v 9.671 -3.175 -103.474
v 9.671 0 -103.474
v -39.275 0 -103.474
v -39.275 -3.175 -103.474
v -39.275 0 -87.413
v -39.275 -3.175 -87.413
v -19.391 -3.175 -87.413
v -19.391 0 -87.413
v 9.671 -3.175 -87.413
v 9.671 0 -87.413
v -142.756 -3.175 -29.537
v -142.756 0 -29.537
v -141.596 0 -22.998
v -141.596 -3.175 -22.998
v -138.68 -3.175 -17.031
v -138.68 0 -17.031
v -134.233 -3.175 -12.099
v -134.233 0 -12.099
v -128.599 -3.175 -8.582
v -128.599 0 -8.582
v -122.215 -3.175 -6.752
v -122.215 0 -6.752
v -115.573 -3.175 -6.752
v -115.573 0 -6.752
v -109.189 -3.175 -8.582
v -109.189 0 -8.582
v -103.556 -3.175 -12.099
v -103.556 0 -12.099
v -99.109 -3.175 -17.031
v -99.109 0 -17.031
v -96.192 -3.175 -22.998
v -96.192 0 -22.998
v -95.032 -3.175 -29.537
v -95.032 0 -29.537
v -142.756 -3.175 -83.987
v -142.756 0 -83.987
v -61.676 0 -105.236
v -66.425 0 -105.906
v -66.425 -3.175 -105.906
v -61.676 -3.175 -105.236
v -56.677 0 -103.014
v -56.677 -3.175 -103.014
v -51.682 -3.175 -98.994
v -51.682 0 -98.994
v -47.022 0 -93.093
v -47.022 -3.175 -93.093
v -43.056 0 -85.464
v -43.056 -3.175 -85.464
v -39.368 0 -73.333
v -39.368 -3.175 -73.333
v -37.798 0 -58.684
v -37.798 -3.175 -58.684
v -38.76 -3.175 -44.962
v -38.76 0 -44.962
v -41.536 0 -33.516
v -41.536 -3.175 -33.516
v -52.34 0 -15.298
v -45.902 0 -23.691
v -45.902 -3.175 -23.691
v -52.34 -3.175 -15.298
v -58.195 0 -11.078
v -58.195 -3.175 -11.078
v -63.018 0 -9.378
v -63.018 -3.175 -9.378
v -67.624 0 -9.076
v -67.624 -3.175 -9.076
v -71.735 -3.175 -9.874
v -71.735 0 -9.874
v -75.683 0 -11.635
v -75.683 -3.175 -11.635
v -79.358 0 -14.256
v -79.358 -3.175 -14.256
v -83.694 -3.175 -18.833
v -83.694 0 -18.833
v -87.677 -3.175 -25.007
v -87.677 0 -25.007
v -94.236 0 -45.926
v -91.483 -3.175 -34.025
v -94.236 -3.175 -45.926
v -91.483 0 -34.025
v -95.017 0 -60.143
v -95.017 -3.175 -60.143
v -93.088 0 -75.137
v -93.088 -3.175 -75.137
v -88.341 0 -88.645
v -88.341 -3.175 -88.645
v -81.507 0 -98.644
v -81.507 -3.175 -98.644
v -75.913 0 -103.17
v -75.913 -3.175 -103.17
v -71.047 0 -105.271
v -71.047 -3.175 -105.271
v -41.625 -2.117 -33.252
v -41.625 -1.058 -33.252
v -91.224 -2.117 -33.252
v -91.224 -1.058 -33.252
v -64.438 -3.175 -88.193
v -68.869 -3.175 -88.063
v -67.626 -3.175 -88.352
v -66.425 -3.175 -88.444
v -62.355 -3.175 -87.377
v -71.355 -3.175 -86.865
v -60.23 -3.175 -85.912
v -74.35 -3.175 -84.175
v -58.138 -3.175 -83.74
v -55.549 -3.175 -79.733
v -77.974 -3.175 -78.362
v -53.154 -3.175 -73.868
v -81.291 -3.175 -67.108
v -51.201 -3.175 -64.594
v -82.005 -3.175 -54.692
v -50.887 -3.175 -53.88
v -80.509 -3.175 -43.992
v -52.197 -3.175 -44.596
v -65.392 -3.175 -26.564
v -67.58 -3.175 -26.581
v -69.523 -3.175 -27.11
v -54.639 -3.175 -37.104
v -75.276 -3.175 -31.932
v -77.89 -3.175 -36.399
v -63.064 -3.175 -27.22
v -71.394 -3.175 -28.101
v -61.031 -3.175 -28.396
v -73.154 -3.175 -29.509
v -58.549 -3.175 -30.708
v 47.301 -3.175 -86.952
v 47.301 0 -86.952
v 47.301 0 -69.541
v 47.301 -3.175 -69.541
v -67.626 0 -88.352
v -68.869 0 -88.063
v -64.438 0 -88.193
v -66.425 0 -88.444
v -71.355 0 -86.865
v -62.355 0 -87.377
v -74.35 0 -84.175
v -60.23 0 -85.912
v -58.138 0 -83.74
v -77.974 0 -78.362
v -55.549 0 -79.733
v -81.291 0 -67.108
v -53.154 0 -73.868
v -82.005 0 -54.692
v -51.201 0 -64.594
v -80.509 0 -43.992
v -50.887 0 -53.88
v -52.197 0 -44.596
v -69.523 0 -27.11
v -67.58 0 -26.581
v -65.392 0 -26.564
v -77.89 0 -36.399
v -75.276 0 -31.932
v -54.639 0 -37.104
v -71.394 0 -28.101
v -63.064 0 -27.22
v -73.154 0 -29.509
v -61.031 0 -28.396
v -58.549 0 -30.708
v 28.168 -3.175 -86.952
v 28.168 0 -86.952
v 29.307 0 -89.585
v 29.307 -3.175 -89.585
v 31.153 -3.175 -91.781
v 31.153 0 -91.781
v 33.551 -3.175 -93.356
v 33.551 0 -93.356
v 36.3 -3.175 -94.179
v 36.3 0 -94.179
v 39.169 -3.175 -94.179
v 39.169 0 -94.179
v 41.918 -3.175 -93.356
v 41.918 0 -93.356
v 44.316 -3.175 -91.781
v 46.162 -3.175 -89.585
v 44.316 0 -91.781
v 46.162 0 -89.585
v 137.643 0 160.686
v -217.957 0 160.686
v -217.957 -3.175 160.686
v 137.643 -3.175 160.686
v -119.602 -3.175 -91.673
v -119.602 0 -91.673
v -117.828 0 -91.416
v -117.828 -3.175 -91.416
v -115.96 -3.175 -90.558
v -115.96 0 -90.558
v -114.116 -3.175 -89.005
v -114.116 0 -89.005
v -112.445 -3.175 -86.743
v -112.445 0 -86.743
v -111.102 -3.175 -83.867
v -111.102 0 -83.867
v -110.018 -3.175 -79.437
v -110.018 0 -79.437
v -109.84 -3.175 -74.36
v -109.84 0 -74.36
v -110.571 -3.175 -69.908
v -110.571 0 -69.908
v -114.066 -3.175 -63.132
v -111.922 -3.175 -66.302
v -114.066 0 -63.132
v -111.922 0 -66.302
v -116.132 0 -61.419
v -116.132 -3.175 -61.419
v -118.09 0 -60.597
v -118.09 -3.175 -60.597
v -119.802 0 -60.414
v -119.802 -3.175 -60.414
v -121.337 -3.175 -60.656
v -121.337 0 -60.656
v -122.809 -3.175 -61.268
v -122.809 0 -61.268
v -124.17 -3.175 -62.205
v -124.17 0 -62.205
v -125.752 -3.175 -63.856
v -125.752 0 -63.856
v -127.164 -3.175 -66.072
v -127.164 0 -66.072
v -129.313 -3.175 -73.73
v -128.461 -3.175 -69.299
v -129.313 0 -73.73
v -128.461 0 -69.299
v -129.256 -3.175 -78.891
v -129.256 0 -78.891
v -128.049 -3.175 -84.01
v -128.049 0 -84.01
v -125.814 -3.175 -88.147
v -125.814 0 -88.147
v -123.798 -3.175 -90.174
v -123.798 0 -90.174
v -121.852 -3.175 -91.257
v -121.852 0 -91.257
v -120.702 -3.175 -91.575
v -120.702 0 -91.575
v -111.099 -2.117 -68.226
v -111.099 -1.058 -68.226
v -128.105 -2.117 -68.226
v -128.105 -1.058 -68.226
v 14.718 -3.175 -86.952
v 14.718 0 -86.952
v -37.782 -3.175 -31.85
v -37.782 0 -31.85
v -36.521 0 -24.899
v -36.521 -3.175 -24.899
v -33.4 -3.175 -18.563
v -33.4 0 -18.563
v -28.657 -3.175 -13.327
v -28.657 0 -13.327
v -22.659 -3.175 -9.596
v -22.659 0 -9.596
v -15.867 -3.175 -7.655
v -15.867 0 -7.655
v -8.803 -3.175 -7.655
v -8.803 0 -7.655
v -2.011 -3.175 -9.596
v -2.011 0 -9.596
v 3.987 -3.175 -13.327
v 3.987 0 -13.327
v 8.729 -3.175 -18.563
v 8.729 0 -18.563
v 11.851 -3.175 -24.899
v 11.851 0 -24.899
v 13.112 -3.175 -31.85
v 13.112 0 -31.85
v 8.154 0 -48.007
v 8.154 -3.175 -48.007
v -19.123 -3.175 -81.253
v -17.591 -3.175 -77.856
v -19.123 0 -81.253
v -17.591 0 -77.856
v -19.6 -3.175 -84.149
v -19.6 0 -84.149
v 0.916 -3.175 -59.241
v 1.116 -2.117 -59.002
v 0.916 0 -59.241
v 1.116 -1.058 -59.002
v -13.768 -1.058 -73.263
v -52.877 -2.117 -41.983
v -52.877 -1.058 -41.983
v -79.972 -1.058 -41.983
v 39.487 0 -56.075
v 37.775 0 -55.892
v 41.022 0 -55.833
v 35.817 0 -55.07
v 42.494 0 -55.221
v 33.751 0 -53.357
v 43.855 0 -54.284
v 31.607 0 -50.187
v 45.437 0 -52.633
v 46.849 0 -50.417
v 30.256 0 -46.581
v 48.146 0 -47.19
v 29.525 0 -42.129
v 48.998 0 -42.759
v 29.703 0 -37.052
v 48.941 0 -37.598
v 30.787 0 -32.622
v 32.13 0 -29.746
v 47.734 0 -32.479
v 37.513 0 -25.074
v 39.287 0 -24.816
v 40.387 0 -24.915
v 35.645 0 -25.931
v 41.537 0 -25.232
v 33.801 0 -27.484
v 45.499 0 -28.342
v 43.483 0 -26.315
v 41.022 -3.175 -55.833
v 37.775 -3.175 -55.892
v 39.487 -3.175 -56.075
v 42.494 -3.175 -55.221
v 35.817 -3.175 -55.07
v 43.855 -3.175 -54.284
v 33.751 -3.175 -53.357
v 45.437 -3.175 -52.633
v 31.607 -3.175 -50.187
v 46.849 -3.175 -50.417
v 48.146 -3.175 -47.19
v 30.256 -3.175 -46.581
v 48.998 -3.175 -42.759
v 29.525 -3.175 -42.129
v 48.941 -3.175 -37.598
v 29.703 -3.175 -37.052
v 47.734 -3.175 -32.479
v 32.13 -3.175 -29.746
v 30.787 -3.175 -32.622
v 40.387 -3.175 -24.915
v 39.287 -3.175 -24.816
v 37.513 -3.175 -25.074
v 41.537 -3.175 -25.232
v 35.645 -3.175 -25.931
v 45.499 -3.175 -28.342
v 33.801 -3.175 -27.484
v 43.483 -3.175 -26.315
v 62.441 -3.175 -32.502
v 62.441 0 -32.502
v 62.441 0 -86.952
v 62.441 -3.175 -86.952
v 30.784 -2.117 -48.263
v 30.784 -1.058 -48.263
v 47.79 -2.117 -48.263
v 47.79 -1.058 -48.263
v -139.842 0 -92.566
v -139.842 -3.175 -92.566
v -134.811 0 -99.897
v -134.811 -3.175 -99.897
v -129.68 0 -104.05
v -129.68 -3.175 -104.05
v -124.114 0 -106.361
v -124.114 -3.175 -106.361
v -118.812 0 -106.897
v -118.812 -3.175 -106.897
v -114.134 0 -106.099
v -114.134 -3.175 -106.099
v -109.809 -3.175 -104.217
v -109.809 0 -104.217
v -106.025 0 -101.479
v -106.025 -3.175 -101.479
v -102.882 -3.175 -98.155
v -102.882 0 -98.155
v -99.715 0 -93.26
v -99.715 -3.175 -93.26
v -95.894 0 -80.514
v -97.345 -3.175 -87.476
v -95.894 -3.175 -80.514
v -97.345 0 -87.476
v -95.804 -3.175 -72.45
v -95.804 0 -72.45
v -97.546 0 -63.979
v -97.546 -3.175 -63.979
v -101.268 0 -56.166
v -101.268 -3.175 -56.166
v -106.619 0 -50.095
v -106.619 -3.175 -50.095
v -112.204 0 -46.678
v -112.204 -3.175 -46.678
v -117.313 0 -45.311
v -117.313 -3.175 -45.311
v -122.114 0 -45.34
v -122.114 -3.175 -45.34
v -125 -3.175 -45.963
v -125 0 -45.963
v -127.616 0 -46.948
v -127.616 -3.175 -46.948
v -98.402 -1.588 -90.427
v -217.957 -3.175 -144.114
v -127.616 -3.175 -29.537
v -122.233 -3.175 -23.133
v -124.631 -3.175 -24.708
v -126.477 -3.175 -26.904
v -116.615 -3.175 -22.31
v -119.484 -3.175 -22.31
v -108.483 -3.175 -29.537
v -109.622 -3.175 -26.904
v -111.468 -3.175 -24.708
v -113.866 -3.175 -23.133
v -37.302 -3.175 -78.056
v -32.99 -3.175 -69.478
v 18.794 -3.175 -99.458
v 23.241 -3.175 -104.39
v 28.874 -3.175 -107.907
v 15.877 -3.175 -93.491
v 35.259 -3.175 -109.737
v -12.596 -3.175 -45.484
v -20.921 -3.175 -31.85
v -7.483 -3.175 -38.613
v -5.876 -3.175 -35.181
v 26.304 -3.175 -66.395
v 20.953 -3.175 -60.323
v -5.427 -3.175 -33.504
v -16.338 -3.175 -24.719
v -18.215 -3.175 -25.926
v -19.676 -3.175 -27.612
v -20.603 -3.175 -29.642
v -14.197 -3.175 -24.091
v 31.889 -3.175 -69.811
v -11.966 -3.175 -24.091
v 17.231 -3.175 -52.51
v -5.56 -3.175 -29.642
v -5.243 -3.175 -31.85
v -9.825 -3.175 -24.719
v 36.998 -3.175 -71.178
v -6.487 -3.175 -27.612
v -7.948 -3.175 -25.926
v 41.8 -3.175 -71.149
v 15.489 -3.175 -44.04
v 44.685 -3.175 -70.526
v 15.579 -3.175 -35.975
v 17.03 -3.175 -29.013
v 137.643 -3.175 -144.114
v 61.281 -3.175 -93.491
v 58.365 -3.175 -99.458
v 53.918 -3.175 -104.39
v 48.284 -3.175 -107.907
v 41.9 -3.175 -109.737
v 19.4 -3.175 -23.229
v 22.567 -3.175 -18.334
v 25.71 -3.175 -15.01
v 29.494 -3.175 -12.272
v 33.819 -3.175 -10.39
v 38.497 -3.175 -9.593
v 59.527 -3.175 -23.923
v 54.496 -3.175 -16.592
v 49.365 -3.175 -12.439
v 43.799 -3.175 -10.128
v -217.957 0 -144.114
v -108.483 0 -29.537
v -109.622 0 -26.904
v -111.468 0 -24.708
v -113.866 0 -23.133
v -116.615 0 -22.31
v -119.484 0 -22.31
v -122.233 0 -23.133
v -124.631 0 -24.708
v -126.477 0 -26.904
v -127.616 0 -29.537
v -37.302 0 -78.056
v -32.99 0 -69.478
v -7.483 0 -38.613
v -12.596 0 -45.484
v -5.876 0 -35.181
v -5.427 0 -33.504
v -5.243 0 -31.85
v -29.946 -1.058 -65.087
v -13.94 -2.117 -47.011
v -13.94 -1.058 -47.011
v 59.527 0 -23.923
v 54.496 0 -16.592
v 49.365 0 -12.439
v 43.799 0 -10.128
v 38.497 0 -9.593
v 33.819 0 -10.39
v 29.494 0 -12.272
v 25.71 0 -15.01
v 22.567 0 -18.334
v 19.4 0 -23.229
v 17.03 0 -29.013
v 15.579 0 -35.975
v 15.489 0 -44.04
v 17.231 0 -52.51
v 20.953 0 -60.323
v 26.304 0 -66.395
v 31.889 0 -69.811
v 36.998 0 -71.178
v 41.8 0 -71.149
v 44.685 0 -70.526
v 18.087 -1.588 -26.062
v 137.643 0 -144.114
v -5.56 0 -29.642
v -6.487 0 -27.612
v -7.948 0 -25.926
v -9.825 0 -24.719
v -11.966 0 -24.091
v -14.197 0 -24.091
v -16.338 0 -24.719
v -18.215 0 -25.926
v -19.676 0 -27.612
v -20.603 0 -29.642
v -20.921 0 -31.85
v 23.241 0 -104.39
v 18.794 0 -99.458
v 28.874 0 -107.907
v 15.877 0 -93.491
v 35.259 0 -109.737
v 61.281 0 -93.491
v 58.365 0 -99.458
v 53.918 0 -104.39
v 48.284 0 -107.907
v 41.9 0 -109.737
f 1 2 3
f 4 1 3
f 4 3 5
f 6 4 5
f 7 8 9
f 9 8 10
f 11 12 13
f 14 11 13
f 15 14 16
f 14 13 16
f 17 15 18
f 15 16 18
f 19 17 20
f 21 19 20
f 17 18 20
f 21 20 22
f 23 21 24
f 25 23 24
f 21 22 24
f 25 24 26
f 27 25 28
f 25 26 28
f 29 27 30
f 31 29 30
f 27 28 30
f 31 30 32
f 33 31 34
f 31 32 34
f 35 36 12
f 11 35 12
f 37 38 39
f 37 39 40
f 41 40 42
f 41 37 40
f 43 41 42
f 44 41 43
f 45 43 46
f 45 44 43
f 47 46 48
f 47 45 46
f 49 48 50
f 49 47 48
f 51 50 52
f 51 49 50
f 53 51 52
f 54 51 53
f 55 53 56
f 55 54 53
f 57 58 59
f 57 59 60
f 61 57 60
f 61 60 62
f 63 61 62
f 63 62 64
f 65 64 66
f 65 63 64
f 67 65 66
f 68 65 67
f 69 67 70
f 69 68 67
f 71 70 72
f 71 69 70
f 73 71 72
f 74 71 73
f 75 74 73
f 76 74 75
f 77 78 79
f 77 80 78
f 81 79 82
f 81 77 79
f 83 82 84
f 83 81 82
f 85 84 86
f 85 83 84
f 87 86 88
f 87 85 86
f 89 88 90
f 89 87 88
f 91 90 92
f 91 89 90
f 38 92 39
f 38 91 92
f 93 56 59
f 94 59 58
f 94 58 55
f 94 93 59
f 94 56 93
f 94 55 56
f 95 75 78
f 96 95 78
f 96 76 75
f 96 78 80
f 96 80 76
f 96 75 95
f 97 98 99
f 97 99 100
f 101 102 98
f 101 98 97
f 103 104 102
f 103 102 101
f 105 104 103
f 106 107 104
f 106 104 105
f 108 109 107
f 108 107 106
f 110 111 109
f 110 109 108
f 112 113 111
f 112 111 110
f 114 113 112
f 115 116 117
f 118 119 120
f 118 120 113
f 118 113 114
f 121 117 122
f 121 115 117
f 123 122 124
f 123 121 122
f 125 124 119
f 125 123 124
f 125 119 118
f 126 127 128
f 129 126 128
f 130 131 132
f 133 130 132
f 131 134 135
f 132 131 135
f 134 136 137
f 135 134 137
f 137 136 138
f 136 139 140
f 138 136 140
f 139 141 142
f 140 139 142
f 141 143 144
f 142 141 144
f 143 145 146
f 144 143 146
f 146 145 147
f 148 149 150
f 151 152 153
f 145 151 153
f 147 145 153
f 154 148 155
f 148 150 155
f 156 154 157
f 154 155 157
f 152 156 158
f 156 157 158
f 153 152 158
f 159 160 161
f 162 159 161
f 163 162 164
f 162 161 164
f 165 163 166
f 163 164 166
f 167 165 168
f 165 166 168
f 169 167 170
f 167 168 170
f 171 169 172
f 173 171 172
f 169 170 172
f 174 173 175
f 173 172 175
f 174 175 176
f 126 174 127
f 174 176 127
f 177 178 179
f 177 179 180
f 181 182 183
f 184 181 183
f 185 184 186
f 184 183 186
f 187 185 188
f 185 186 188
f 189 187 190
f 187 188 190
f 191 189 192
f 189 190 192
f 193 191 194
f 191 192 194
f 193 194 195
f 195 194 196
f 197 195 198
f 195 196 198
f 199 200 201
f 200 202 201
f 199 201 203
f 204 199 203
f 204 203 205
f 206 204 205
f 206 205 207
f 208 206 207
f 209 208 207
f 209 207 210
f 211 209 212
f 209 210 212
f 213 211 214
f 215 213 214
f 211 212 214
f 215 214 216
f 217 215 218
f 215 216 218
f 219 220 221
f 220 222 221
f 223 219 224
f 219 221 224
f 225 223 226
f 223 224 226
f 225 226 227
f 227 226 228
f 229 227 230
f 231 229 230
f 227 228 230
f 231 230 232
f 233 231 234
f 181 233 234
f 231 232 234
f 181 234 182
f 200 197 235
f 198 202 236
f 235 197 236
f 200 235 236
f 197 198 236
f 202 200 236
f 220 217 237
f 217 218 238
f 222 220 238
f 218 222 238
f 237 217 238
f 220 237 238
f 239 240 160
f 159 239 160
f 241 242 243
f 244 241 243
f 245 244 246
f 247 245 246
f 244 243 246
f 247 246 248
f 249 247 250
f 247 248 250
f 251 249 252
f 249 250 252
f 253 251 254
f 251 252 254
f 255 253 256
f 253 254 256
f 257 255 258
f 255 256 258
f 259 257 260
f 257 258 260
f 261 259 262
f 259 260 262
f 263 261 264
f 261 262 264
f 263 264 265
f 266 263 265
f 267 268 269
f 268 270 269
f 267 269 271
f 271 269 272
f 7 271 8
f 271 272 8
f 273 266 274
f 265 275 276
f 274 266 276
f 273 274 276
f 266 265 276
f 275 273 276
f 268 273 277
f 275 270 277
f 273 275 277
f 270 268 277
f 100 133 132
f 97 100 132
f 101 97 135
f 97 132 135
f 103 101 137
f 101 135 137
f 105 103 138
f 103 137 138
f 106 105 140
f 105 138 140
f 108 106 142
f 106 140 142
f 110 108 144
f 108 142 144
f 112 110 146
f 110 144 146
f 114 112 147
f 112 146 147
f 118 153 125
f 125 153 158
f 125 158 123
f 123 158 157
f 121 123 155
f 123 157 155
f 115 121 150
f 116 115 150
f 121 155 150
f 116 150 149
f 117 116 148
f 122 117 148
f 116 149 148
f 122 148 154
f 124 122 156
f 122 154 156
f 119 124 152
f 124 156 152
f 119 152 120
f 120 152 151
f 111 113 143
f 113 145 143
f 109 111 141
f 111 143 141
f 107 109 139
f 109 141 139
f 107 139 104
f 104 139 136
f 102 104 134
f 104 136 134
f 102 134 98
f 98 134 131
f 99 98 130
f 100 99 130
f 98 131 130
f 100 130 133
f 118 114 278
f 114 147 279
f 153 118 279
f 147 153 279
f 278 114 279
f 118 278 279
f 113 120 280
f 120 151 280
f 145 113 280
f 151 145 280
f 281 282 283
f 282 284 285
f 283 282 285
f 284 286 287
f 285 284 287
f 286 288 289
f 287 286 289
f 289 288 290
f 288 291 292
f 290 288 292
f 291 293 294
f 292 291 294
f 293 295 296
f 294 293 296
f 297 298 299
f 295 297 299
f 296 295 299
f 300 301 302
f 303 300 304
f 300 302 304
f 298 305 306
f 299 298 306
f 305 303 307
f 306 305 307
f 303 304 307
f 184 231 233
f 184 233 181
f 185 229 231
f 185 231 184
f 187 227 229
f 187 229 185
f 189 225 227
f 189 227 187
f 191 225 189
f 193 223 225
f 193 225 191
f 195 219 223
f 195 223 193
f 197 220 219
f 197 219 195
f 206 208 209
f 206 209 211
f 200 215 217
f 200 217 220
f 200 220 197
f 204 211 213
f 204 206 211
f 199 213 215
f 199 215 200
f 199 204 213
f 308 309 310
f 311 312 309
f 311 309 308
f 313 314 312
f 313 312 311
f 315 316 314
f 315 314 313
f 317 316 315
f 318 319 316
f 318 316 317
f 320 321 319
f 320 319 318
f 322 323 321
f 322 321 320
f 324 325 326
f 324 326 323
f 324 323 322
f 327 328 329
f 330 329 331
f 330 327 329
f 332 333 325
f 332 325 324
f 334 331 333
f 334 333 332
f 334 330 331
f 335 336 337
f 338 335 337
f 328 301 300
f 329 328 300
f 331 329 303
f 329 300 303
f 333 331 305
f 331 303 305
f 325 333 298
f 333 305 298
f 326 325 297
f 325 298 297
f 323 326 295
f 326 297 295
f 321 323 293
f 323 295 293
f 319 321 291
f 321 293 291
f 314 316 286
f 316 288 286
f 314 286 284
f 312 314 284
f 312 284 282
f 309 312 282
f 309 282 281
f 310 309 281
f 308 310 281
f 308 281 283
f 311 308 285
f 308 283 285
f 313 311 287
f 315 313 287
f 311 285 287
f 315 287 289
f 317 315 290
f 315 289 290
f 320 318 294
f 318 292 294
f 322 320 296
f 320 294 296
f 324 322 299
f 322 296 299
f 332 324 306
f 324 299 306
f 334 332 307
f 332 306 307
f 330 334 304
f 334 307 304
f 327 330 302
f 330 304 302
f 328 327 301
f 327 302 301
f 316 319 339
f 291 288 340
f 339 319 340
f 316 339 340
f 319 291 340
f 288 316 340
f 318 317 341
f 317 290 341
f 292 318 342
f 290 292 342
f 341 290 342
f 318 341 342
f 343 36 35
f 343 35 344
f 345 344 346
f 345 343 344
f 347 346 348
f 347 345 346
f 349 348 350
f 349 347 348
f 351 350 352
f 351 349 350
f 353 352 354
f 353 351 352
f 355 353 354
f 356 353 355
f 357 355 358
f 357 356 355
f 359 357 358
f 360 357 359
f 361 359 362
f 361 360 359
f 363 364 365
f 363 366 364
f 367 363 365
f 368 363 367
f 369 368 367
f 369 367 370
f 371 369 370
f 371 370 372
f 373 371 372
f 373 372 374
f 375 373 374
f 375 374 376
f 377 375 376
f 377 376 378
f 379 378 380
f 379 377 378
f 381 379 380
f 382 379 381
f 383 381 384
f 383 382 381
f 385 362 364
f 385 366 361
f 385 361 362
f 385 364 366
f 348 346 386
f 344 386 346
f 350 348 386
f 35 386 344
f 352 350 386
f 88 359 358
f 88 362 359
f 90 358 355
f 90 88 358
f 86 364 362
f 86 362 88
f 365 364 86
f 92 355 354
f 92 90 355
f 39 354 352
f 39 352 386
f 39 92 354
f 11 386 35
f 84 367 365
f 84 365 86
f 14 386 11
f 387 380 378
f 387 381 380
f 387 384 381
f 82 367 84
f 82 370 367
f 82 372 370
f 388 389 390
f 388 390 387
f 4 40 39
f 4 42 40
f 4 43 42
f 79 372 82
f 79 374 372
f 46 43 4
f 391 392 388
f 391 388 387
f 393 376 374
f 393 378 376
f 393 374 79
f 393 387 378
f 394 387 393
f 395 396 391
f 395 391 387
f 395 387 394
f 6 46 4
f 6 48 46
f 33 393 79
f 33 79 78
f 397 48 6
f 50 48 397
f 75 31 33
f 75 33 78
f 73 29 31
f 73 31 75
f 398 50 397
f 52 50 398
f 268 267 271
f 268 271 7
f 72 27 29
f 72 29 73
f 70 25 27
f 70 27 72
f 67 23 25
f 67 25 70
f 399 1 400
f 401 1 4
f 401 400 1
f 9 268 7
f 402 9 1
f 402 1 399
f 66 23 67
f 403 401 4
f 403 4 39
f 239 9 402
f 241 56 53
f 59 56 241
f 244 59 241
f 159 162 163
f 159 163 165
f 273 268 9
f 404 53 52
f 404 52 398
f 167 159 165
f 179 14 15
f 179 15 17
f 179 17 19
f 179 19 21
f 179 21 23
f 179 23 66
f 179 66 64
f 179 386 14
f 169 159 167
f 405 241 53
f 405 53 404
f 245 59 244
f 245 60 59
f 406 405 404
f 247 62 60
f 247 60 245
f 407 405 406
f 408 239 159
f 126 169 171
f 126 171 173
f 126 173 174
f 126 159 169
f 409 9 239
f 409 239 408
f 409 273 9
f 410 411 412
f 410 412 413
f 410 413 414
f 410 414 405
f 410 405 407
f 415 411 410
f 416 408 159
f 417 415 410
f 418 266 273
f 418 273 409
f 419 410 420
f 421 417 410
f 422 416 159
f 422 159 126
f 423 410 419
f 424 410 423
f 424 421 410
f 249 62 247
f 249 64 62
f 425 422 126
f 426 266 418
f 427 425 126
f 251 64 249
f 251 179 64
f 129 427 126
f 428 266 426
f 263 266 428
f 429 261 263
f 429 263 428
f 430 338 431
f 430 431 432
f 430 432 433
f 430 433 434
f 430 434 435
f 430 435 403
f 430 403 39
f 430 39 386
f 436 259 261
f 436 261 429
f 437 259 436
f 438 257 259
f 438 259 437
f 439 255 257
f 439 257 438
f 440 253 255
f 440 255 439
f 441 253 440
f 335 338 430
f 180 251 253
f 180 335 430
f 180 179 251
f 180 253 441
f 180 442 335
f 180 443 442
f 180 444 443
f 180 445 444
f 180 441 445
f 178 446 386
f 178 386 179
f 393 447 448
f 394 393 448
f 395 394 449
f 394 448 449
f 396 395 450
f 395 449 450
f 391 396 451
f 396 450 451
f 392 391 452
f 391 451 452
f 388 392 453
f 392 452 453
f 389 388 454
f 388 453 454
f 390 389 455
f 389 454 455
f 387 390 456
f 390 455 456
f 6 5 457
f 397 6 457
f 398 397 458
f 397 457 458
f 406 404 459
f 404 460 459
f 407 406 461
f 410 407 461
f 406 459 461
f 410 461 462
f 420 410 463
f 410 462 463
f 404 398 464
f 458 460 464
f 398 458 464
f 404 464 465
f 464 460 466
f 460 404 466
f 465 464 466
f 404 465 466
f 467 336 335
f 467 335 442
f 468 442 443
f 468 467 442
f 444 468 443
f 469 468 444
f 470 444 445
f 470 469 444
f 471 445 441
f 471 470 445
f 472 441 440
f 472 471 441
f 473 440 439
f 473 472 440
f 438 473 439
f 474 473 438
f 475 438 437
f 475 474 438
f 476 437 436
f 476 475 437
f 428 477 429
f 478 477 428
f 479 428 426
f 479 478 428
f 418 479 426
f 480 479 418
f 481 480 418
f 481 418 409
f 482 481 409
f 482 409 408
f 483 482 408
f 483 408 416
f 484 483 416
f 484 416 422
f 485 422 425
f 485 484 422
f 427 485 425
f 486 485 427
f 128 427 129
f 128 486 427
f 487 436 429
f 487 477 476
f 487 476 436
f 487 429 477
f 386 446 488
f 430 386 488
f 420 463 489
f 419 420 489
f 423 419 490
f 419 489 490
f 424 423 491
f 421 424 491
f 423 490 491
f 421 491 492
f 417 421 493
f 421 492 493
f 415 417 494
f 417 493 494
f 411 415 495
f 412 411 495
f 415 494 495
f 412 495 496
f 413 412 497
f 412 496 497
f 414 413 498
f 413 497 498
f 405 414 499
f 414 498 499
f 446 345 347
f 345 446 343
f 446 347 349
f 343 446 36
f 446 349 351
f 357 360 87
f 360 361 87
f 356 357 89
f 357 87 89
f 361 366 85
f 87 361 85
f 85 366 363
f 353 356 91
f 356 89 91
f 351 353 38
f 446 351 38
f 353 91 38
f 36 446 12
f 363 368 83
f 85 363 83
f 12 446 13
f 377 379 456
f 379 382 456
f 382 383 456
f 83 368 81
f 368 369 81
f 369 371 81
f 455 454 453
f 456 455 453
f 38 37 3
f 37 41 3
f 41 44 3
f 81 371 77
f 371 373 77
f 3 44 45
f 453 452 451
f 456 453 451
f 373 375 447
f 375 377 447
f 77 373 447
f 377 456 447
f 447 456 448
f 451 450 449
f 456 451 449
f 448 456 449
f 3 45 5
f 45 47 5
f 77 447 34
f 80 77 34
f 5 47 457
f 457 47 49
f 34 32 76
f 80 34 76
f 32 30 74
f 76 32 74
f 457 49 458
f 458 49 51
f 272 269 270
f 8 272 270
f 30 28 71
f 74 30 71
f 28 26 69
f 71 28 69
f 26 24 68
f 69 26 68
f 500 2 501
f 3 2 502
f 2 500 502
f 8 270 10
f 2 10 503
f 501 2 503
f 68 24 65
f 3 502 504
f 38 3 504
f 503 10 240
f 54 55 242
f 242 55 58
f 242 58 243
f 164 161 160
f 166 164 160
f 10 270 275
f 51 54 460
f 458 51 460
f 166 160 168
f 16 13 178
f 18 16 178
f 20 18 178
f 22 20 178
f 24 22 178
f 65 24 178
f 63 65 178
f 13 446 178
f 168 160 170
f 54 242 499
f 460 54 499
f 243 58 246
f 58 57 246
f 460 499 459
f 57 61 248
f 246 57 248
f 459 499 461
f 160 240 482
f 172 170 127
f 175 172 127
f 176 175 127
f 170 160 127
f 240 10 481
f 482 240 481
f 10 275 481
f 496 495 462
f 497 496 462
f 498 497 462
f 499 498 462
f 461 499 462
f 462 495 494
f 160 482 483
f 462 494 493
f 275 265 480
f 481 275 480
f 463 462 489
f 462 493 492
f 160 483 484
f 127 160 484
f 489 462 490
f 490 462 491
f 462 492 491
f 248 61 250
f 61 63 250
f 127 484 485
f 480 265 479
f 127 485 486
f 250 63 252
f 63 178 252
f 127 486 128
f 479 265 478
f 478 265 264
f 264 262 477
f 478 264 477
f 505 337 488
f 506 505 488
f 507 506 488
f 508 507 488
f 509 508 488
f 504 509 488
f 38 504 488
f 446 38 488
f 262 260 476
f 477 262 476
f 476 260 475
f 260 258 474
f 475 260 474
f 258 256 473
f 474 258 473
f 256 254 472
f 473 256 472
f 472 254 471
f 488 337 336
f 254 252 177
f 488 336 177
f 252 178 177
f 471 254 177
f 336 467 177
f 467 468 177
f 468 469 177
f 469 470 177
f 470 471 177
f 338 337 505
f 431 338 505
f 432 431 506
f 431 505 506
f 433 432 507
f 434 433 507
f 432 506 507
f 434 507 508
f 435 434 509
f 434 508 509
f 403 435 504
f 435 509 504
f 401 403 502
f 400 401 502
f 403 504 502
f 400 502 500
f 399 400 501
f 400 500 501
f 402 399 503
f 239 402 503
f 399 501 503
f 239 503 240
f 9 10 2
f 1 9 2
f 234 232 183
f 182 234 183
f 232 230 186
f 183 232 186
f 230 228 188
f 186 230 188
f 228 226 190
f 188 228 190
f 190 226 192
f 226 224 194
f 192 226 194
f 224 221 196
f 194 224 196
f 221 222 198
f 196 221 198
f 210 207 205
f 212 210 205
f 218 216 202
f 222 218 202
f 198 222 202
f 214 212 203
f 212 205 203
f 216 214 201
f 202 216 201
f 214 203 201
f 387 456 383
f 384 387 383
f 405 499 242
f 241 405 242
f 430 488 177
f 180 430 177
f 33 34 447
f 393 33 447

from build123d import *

# Parameters (mm, degrees)
F0_W     = 355.6
F0_H     = 304.8
F1_DEPTH = 3.175


with BuildPart() as f1:
    # F0 (on Front) → F1 (new body)
    with BuildSketch(Plane.XZ):
        with Locations((-40.1574715292, 8.2864418507)):
            Rectangle(F0_W, F0_H)
        with BuildLine():
            ThreePointArc((-142.7557298629, -29.5373028781), (-118.8940867618, -6.520460227), (-95.0324436608, -29.5373028781))
            Line((-95.0324436608, -29.5373028781), (-108.4827767409, -29.5373028781))
            ThreePointArc((-108.4827767409, -29.5373028781), (-118.0494302176, -22.2060663534), (-127.6160836943, -29.5373028781))
            Line((-127.6160836943, -29.5373028781), (-127.6160836943, -46.9478685959))
            add(Edge.make_bspline(
                [(-142.7557298629, -83.987326965), (-126.9738204318, -160.3293840028), (-98.4015956376, -90.4268434154), (-69.8293708434, -20.5243028281), (-127.6160836943, -46.9478685959)],
                knots=[4.9726967666, 4.9726967666, 4.9726967666, 7.3692535387, 7.3692535387, 9.7658103108, 9.7658103108, 9.7658103108], degree=2, weights=[1, 0.3639618282, 1, 0.3639618282, 1]))
            Line((-142.7557298629, -83.987326965), (-142.7557298629, -29.5373028781))
        make_face(mode=Mode.SUBTRACT)
        with BuildLine():
            add(Edge.make_bspline(
                [(-66.4248388269, -105.906184584), (-16.8258911035, -105.906184584), (-41.6253649652, -33.2520364982), (-66.4248388269, 39.4021115876), (-91.2243126886, -33.2520364982), (-116.0237865503, -105.906184584), (-66.4248388269, -105.906184584)],
                knots=[0, 0, 0, 2.0943951024, 2.0943951024, 4.1887902048, 4.1887902048, 6.2831853072, 6.2831853072, 6.2831853072], degree=2, weights=[1, 0.5, 1, 0.5, 1, 0.5, 1]))
        make_face(mode=Mode.SUBTRACT)
        with BuildLine():
            ThreePointArc((-5.2426088433, -31.8500286278), (-13.0815814728, -24.0110559984), (-20.9205541022, -31.8500286278))
            Line((-20.9205541022, -31.8500286278), (-37.7822094142, -31.8500286278))
            ThreePointArc((-37.7822094142, -31.8500286278), (-12.3350775563, -7.4090032919), (13.1120543017, -31.8500286278))
            add(Edge.make_bspline(
                [(13.1120543017, -31.8500286278), (6.6114428313, -69.7065332751), (-22.450112245, -69.0585513461), (-19.3909995049, -87.4132206957)],
                knots=[0, 0, 0, 0, 64.3717082228, 64.3717082228, 64.3717082228, 64.3717082228], degree=3))
            Line((-19.3909995049, -87.4132206957), (9.6705608896, -87.4132206957))
            Line((9.6705608896, -87.4132206957), (9.6705608896, -103.4735581493))
            Line((9.6705608896, -103.4735581493), (-39.2752269973, -103.4735581493))
            Line((-39.2752269973, -103.4735581493), (-39.2752269973, -87.4132206957))
            add(Edge.make_bspline(
                [(-39.2752269973, -87.4132206957), (-37.9446880513, -62.5160173481), (-5.6249974927, -45.9984192894), (-5.2426088433, -31.8500286278)],
                knots=[0, 0, 0, 0, 65.1574048837, 65.1574048837, 65.1574048837, 65.1574048837], degree=3))
        make_face(mode=Mode.SUBTRACT)
        with BuildLine():
            ThreePointArc((62.4407868077, -86.9517425749), (38.5791437066, -109.9685852259), (14.7175006056, -86.9517425749))
            Line((14.7175006056, -86.9517425749), (28.1678336858, -86.9517425749))
            ThreePointArc((28.1678336858, -86.9517425749), (37.7344871624, -94.2829790995), (47.3011406391, -86.9517425749))
            Line((47.3011406391, -86.9517425749), (47.3011406391, -69.541176857))
            add(Edge.make_bspline(
                [(62.4407868077, -32.5017184879), (46.6588773766, 43.8403385498), (18.0866525824, -26.0622020375), (-10.4855722118, -95.9647426249), (47.3011406391, -69.541176857)],
                knots=[4.9726967666, 4.9726967666, 4.9726967666, 7.3692535387, 7.3692535387, 9.7658103108, 9.7658103108, 9.7658103108], degree=2, weights=[1, 0.3639618282, 1, 0.3639618282, 1]))
            Line((62.4407868077, -32.5017184879), (62.4407868077, -86.9517425749))
        make_face(mode=Mode.SUBTRACT)
    extrude(amount=F1_DEPTH)


with BuildPart() as f1b:
    # F0 (on Front) → F1, piece 2 (new body)
    with BuildSketch(Plane.XZ):
        with BuildLine():
            add(Edge.make_bspline(
                [(-66.4248388269, -88.443591274), (-39.3299198243, -88.443591274), (-52.8773793256, -41.9833331532), (-66.4248388269, 4.4769249675), (-79.9722983282, -41.9833331532), (-93.5197578295, -88.443591274), (-66.4248388269, -88.443591274)],
                knots=[0, 0, 0, 2.0943951024, 2.0943951024, 4.1887902048, 4.1887902048, 6.2831853072, 6.2831853072, 6.2831853072], degree=2, weights=[1, 0.5, 1, 0.5, 1, 0.5, 1]))
        make_face()
    extrude(amount=F1_DEPTH)


with BuildPart() as f1c:
    # F0 (on Front) → F1, piece 3 (new body)
    with BuildSketch(Plane.XZ):
        with BuildLine():
            add(Edge.make_bspline(
                [(-119.6021508598, -91.6728613435), (-102.5956020408, -91.6728613435), (-111.0988764503, -68.2260265909), (-119.6021508598, -44.7791918383), (-128.1054252693, -68.2260265909), (-136.6086996787, -91.6728613435), (-119.6021508598, -91.6728613435)],
                knots=[0, 0, 0, 2.0943951024, 2.0943951024, 4.1887902048, 4.1887902048, 6.2831853072, 6.2831853072, 6.2831853072], degree=2, weights=[1, 0.5, 1, 0.5, 1, 0.5, 1]))
        make_face()
    extrude(amount=F1_DEPTH)


with BuildPart() as f1d:
    # F0 (on Front) → F1, piece 4 (new body)
    with BuildSketch(Plane.XZ):
        with BuildLine():
            add(Edge.make_bspline(
                [(39.2872078046, -24.8161841095), (22.2806589856, -24.8161841095), (30.7839333951, -48.2630188621), (39.2872078046, -71.7098536147), (47.7904822141, -48.2630188621), (56.2937566235, -24.8161841095), (39.2872078046, -24.8161841095)],
                knots=[0, 0, 0, 2.0943951024, 2.0943951024, 4.1887902048, 4.1887902048, 6.2831853072, 6.2831853072, 6.2831853072], degree=2, weights=[1, 0.5, 1, 0.5, 1, 0.5, 1]))
        make_face()
    extrude(amount=F1_DEPTH)


solid = Compound([f1.part, f1b.part, f1c.part, f1d.part])
